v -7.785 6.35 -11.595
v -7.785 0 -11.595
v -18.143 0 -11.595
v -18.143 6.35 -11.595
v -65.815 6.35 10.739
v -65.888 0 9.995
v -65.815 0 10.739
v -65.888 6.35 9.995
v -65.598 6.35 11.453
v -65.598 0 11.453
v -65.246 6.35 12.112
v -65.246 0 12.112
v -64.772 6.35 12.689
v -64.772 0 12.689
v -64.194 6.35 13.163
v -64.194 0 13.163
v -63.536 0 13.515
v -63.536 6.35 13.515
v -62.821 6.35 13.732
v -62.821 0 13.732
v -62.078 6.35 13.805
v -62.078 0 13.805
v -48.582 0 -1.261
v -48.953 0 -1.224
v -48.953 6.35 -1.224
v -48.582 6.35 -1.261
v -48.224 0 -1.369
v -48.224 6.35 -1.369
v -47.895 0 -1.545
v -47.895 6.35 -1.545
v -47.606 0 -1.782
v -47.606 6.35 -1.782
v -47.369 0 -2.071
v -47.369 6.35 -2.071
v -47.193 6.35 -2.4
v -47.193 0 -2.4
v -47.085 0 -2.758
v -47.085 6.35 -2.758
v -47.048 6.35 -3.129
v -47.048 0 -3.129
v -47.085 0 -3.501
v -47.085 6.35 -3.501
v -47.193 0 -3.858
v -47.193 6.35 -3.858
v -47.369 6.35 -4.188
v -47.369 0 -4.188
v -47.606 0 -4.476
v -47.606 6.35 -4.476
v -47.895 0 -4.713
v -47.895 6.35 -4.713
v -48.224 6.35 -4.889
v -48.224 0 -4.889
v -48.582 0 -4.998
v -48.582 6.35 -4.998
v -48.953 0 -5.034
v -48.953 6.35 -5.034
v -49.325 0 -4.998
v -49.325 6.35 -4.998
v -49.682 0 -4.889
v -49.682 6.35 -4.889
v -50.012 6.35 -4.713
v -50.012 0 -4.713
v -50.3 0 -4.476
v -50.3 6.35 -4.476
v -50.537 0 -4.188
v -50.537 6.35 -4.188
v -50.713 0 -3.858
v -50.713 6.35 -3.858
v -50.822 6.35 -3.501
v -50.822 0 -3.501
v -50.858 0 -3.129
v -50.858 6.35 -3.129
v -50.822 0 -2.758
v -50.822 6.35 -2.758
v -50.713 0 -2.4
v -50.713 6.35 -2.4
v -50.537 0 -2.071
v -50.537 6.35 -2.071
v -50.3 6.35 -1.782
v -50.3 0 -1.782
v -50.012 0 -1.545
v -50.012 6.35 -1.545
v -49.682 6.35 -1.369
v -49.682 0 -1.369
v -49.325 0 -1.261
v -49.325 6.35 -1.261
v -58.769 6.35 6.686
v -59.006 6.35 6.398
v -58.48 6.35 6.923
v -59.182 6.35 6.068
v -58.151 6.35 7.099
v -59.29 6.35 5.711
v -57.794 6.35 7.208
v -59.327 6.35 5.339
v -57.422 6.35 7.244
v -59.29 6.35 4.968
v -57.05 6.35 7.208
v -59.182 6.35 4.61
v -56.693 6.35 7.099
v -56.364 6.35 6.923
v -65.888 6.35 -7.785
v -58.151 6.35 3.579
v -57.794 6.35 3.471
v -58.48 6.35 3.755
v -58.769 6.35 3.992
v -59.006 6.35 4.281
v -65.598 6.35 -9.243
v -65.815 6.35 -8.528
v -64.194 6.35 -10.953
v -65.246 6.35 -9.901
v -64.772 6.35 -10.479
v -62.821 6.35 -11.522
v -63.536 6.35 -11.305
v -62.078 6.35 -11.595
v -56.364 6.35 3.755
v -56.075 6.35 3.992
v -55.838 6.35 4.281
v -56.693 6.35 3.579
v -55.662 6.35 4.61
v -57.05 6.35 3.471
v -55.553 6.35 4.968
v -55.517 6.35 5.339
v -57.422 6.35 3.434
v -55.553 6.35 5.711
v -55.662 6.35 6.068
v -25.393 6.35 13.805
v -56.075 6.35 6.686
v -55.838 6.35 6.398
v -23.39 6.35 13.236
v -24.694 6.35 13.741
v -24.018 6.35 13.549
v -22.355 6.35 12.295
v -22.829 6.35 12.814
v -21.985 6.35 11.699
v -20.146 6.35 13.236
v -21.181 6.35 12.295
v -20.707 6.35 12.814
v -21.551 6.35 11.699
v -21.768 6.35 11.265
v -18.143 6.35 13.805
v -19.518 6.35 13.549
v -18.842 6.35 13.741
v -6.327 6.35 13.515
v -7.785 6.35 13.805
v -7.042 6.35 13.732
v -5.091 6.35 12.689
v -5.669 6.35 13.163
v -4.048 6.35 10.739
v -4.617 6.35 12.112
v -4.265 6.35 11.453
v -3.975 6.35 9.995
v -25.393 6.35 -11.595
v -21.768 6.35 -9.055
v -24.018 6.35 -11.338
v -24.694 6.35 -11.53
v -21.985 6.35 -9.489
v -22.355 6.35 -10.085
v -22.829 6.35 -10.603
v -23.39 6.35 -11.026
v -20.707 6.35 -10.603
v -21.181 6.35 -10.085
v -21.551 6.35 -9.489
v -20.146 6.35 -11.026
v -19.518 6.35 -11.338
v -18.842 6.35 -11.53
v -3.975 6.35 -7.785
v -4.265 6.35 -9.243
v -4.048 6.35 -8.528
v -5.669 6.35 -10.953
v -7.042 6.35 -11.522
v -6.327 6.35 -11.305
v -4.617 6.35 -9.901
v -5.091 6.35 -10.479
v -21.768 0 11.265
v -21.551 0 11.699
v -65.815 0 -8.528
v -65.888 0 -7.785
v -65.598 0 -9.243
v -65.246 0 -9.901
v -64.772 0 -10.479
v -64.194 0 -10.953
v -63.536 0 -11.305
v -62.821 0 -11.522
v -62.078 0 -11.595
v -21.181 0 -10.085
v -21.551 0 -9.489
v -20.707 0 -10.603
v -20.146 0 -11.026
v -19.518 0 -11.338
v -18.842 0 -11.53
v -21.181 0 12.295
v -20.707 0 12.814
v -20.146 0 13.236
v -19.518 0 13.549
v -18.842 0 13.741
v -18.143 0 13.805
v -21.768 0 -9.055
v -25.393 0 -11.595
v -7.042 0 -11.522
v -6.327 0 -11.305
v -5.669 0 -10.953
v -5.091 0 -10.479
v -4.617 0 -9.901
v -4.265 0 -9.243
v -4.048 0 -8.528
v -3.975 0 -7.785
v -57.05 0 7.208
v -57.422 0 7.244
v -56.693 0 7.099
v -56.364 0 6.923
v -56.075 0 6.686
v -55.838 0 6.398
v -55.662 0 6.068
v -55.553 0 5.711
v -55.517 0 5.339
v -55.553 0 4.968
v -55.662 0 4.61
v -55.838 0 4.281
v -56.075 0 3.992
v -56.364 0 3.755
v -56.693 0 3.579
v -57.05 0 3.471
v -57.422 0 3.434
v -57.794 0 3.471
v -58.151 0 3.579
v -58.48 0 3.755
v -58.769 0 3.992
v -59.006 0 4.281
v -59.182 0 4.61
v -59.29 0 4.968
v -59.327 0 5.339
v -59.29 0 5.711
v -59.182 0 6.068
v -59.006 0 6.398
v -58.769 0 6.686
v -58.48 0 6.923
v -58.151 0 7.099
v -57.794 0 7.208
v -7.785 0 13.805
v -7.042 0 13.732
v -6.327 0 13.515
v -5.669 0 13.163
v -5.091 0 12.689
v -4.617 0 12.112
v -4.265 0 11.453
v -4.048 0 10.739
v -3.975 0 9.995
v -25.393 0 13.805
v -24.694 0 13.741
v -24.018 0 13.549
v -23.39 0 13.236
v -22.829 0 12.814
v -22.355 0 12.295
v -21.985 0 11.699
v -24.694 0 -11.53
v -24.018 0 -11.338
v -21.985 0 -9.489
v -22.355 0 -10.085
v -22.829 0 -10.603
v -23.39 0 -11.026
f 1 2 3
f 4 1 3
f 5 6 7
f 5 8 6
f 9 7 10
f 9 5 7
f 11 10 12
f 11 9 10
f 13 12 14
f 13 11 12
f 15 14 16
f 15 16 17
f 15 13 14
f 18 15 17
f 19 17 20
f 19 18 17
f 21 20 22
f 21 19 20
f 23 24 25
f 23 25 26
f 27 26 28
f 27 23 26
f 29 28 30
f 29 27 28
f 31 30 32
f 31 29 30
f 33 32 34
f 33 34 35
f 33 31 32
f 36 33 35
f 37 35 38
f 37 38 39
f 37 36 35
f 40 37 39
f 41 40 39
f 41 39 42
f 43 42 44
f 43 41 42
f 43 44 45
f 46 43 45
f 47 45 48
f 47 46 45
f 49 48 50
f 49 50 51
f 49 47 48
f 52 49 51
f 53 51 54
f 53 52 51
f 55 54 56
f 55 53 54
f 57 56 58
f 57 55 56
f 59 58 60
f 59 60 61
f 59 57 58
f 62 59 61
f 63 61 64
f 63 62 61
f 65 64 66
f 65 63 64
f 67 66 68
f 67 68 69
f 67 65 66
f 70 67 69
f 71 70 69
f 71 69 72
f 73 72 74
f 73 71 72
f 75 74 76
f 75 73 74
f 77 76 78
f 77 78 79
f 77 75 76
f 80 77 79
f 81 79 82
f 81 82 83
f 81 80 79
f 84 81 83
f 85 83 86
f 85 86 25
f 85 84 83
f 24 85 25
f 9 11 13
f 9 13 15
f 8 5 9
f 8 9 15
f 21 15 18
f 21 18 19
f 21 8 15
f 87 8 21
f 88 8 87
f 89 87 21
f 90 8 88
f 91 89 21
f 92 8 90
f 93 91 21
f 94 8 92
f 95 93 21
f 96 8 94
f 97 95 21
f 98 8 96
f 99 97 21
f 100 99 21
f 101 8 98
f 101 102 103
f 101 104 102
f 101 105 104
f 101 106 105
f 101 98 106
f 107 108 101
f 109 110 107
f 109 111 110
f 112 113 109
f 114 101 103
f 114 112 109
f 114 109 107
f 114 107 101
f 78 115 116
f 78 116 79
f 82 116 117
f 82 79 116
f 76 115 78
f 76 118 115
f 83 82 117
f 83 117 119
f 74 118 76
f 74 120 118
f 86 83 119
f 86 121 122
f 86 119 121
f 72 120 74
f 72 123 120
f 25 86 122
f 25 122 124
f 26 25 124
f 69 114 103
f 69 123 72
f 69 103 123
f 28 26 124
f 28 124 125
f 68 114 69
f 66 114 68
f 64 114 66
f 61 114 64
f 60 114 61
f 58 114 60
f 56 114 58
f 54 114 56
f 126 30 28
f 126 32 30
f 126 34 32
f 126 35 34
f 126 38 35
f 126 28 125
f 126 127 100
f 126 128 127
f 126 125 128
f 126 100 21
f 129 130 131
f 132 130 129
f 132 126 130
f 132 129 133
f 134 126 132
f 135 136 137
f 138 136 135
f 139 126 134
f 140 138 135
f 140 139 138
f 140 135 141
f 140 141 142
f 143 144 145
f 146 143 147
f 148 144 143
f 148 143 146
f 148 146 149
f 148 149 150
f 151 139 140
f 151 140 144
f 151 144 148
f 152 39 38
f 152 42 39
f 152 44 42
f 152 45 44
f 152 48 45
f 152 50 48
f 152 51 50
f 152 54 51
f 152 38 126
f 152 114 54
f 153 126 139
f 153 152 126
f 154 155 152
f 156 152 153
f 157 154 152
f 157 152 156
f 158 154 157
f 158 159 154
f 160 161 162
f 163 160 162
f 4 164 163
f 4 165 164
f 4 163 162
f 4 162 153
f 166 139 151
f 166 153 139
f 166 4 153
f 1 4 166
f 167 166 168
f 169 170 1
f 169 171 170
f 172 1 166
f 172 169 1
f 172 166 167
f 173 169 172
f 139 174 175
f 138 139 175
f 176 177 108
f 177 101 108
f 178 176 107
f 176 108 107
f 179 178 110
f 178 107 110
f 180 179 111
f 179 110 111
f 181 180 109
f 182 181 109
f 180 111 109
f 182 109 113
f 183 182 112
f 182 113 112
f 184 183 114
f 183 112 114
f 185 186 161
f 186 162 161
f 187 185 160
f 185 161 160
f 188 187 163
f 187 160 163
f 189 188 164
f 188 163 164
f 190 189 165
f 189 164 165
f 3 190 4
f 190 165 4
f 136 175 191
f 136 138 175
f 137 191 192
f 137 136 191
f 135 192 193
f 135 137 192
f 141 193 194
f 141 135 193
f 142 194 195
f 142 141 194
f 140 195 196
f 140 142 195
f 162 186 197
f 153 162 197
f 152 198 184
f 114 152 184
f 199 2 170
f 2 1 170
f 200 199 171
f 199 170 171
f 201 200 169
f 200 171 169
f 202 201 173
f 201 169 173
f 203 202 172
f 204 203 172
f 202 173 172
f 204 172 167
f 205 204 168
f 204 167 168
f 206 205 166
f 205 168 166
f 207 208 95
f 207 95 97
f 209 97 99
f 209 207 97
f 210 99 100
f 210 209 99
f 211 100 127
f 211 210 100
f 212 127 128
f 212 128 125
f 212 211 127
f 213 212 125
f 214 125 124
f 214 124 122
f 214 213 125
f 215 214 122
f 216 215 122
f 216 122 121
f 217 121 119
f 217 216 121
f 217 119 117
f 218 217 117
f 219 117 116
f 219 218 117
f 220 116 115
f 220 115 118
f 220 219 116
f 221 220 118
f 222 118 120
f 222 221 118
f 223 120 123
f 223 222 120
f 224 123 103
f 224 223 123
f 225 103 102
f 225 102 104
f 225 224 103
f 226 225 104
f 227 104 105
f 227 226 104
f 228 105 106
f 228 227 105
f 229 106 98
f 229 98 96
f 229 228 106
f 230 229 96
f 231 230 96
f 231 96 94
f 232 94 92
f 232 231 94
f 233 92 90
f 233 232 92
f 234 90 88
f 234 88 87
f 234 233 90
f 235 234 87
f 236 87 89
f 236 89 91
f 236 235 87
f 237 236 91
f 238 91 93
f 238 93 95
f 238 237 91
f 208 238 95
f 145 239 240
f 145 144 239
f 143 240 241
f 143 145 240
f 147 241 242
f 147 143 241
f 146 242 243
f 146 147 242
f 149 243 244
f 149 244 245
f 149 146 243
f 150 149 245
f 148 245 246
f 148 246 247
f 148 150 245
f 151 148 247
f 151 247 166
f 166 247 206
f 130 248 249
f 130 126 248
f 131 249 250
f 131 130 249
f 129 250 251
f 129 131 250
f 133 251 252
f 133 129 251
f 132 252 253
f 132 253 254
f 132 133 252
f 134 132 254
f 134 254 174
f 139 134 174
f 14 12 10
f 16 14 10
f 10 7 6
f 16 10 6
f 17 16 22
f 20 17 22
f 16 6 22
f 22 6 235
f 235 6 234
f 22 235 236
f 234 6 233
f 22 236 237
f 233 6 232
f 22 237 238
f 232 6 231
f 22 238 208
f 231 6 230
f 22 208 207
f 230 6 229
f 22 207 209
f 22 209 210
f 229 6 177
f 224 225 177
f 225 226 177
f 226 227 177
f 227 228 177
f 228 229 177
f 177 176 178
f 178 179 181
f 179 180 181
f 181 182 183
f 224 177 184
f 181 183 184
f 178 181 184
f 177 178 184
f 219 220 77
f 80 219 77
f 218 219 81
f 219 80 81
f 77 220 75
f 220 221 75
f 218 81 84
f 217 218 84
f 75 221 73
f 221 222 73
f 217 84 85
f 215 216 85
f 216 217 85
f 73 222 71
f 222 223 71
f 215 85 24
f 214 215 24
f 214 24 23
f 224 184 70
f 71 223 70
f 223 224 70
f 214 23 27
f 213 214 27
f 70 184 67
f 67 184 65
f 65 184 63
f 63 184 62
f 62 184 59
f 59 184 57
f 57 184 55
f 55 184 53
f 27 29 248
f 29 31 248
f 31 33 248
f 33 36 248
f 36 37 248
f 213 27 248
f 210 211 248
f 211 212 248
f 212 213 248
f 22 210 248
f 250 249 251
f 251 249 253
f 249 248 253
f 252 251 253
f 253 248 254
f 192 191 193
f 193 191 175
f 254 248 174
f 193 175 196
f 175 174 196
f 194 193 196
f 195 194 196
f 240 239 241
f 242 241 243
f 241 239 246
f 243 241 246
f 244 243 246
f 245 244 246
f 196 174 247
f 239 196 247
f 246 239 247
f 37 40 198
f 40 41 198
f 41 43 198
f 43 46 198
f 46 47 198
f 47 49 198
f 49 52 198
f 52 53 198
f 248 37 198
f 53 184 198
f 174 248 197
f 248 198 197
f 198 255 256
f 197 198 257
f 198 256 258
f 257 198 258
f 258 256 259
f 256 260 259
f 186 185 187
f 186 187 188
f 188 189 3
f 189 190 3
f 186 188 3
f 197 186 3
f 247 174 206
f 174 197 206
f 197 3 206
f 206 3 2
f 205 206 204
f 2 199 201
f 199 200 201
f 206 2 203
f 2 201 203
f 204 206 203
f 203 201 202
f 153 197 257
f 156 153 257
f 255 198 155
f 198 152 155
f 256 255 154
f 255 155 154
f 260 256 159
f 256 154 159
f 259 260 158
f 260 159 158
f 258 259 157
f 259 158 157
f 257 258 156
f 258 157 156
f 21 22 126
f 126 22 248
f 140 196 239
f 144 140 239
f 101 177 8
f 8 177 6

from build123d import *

# Parameters (mm, degrees)
SKETCH1_R           = 1.905
BOSS_EXTRUDE3_DEPTH = 6.35
FILLET4_R           = 3.81


with BuildPart() as part:
    # Sketch1 → Boss-Extrude3 (new body)
    with BuildSketch(Plane(origin=(0, 0, 0), x_dir=(1, 0, 0), z_dir=(0, 1, 0))):
        Polygon((-65.88775931, 11.594773286), (-65.88775931, -13.805226714), (-23.03795931, -13.805226714), (-21.76795931, -11.265226714), (-20.49795931, -13.805226714), (-3.97525931, -13.805226714), (-3.97525931, 11.594773286), (-20.49795931, 11.594773286), (-21.76795931, 9.054773286), (-23.03795931, 11.594773286), align=None)
        with Locations(Location((-57.421862263, -5.339329667, 0), (0, 0, 270))):
            Circle(SKETCH1_R, mode=Mode.SUBTRACT)
        with Locations(Location((-48.953147413, 3.129385183, 0), (0, 0, 270))):
            Circle(SKETCH1_R, mode=Mode.SUBTRACT)
    extrude(amount=BOSS_EXTRUDE3_DEPTH)

    # Fillet4
    fillet4_edges = [part.edges().sort_by_distance(p)[0] for p in [
        (-23.03795931, 3.175, -11.594773286),
        (-20.49795931, 3.175, -11.594773286),
        (-3.97525931, 3.175, -11.594773286),
        (-3.97525931, 3.175, 13.805226714),
        (-20.49795931, 3.175, 13.805226714),
        (-23.03795931, 3.175, 13.805226714),
        (-65.88775931, 3.175, 13.805226714),
        (-65.88775931, 3.175, -11.594773286),
    ]]
    fillet(fillet4_edges, radius=FILLET4_R)


solid = part.part
